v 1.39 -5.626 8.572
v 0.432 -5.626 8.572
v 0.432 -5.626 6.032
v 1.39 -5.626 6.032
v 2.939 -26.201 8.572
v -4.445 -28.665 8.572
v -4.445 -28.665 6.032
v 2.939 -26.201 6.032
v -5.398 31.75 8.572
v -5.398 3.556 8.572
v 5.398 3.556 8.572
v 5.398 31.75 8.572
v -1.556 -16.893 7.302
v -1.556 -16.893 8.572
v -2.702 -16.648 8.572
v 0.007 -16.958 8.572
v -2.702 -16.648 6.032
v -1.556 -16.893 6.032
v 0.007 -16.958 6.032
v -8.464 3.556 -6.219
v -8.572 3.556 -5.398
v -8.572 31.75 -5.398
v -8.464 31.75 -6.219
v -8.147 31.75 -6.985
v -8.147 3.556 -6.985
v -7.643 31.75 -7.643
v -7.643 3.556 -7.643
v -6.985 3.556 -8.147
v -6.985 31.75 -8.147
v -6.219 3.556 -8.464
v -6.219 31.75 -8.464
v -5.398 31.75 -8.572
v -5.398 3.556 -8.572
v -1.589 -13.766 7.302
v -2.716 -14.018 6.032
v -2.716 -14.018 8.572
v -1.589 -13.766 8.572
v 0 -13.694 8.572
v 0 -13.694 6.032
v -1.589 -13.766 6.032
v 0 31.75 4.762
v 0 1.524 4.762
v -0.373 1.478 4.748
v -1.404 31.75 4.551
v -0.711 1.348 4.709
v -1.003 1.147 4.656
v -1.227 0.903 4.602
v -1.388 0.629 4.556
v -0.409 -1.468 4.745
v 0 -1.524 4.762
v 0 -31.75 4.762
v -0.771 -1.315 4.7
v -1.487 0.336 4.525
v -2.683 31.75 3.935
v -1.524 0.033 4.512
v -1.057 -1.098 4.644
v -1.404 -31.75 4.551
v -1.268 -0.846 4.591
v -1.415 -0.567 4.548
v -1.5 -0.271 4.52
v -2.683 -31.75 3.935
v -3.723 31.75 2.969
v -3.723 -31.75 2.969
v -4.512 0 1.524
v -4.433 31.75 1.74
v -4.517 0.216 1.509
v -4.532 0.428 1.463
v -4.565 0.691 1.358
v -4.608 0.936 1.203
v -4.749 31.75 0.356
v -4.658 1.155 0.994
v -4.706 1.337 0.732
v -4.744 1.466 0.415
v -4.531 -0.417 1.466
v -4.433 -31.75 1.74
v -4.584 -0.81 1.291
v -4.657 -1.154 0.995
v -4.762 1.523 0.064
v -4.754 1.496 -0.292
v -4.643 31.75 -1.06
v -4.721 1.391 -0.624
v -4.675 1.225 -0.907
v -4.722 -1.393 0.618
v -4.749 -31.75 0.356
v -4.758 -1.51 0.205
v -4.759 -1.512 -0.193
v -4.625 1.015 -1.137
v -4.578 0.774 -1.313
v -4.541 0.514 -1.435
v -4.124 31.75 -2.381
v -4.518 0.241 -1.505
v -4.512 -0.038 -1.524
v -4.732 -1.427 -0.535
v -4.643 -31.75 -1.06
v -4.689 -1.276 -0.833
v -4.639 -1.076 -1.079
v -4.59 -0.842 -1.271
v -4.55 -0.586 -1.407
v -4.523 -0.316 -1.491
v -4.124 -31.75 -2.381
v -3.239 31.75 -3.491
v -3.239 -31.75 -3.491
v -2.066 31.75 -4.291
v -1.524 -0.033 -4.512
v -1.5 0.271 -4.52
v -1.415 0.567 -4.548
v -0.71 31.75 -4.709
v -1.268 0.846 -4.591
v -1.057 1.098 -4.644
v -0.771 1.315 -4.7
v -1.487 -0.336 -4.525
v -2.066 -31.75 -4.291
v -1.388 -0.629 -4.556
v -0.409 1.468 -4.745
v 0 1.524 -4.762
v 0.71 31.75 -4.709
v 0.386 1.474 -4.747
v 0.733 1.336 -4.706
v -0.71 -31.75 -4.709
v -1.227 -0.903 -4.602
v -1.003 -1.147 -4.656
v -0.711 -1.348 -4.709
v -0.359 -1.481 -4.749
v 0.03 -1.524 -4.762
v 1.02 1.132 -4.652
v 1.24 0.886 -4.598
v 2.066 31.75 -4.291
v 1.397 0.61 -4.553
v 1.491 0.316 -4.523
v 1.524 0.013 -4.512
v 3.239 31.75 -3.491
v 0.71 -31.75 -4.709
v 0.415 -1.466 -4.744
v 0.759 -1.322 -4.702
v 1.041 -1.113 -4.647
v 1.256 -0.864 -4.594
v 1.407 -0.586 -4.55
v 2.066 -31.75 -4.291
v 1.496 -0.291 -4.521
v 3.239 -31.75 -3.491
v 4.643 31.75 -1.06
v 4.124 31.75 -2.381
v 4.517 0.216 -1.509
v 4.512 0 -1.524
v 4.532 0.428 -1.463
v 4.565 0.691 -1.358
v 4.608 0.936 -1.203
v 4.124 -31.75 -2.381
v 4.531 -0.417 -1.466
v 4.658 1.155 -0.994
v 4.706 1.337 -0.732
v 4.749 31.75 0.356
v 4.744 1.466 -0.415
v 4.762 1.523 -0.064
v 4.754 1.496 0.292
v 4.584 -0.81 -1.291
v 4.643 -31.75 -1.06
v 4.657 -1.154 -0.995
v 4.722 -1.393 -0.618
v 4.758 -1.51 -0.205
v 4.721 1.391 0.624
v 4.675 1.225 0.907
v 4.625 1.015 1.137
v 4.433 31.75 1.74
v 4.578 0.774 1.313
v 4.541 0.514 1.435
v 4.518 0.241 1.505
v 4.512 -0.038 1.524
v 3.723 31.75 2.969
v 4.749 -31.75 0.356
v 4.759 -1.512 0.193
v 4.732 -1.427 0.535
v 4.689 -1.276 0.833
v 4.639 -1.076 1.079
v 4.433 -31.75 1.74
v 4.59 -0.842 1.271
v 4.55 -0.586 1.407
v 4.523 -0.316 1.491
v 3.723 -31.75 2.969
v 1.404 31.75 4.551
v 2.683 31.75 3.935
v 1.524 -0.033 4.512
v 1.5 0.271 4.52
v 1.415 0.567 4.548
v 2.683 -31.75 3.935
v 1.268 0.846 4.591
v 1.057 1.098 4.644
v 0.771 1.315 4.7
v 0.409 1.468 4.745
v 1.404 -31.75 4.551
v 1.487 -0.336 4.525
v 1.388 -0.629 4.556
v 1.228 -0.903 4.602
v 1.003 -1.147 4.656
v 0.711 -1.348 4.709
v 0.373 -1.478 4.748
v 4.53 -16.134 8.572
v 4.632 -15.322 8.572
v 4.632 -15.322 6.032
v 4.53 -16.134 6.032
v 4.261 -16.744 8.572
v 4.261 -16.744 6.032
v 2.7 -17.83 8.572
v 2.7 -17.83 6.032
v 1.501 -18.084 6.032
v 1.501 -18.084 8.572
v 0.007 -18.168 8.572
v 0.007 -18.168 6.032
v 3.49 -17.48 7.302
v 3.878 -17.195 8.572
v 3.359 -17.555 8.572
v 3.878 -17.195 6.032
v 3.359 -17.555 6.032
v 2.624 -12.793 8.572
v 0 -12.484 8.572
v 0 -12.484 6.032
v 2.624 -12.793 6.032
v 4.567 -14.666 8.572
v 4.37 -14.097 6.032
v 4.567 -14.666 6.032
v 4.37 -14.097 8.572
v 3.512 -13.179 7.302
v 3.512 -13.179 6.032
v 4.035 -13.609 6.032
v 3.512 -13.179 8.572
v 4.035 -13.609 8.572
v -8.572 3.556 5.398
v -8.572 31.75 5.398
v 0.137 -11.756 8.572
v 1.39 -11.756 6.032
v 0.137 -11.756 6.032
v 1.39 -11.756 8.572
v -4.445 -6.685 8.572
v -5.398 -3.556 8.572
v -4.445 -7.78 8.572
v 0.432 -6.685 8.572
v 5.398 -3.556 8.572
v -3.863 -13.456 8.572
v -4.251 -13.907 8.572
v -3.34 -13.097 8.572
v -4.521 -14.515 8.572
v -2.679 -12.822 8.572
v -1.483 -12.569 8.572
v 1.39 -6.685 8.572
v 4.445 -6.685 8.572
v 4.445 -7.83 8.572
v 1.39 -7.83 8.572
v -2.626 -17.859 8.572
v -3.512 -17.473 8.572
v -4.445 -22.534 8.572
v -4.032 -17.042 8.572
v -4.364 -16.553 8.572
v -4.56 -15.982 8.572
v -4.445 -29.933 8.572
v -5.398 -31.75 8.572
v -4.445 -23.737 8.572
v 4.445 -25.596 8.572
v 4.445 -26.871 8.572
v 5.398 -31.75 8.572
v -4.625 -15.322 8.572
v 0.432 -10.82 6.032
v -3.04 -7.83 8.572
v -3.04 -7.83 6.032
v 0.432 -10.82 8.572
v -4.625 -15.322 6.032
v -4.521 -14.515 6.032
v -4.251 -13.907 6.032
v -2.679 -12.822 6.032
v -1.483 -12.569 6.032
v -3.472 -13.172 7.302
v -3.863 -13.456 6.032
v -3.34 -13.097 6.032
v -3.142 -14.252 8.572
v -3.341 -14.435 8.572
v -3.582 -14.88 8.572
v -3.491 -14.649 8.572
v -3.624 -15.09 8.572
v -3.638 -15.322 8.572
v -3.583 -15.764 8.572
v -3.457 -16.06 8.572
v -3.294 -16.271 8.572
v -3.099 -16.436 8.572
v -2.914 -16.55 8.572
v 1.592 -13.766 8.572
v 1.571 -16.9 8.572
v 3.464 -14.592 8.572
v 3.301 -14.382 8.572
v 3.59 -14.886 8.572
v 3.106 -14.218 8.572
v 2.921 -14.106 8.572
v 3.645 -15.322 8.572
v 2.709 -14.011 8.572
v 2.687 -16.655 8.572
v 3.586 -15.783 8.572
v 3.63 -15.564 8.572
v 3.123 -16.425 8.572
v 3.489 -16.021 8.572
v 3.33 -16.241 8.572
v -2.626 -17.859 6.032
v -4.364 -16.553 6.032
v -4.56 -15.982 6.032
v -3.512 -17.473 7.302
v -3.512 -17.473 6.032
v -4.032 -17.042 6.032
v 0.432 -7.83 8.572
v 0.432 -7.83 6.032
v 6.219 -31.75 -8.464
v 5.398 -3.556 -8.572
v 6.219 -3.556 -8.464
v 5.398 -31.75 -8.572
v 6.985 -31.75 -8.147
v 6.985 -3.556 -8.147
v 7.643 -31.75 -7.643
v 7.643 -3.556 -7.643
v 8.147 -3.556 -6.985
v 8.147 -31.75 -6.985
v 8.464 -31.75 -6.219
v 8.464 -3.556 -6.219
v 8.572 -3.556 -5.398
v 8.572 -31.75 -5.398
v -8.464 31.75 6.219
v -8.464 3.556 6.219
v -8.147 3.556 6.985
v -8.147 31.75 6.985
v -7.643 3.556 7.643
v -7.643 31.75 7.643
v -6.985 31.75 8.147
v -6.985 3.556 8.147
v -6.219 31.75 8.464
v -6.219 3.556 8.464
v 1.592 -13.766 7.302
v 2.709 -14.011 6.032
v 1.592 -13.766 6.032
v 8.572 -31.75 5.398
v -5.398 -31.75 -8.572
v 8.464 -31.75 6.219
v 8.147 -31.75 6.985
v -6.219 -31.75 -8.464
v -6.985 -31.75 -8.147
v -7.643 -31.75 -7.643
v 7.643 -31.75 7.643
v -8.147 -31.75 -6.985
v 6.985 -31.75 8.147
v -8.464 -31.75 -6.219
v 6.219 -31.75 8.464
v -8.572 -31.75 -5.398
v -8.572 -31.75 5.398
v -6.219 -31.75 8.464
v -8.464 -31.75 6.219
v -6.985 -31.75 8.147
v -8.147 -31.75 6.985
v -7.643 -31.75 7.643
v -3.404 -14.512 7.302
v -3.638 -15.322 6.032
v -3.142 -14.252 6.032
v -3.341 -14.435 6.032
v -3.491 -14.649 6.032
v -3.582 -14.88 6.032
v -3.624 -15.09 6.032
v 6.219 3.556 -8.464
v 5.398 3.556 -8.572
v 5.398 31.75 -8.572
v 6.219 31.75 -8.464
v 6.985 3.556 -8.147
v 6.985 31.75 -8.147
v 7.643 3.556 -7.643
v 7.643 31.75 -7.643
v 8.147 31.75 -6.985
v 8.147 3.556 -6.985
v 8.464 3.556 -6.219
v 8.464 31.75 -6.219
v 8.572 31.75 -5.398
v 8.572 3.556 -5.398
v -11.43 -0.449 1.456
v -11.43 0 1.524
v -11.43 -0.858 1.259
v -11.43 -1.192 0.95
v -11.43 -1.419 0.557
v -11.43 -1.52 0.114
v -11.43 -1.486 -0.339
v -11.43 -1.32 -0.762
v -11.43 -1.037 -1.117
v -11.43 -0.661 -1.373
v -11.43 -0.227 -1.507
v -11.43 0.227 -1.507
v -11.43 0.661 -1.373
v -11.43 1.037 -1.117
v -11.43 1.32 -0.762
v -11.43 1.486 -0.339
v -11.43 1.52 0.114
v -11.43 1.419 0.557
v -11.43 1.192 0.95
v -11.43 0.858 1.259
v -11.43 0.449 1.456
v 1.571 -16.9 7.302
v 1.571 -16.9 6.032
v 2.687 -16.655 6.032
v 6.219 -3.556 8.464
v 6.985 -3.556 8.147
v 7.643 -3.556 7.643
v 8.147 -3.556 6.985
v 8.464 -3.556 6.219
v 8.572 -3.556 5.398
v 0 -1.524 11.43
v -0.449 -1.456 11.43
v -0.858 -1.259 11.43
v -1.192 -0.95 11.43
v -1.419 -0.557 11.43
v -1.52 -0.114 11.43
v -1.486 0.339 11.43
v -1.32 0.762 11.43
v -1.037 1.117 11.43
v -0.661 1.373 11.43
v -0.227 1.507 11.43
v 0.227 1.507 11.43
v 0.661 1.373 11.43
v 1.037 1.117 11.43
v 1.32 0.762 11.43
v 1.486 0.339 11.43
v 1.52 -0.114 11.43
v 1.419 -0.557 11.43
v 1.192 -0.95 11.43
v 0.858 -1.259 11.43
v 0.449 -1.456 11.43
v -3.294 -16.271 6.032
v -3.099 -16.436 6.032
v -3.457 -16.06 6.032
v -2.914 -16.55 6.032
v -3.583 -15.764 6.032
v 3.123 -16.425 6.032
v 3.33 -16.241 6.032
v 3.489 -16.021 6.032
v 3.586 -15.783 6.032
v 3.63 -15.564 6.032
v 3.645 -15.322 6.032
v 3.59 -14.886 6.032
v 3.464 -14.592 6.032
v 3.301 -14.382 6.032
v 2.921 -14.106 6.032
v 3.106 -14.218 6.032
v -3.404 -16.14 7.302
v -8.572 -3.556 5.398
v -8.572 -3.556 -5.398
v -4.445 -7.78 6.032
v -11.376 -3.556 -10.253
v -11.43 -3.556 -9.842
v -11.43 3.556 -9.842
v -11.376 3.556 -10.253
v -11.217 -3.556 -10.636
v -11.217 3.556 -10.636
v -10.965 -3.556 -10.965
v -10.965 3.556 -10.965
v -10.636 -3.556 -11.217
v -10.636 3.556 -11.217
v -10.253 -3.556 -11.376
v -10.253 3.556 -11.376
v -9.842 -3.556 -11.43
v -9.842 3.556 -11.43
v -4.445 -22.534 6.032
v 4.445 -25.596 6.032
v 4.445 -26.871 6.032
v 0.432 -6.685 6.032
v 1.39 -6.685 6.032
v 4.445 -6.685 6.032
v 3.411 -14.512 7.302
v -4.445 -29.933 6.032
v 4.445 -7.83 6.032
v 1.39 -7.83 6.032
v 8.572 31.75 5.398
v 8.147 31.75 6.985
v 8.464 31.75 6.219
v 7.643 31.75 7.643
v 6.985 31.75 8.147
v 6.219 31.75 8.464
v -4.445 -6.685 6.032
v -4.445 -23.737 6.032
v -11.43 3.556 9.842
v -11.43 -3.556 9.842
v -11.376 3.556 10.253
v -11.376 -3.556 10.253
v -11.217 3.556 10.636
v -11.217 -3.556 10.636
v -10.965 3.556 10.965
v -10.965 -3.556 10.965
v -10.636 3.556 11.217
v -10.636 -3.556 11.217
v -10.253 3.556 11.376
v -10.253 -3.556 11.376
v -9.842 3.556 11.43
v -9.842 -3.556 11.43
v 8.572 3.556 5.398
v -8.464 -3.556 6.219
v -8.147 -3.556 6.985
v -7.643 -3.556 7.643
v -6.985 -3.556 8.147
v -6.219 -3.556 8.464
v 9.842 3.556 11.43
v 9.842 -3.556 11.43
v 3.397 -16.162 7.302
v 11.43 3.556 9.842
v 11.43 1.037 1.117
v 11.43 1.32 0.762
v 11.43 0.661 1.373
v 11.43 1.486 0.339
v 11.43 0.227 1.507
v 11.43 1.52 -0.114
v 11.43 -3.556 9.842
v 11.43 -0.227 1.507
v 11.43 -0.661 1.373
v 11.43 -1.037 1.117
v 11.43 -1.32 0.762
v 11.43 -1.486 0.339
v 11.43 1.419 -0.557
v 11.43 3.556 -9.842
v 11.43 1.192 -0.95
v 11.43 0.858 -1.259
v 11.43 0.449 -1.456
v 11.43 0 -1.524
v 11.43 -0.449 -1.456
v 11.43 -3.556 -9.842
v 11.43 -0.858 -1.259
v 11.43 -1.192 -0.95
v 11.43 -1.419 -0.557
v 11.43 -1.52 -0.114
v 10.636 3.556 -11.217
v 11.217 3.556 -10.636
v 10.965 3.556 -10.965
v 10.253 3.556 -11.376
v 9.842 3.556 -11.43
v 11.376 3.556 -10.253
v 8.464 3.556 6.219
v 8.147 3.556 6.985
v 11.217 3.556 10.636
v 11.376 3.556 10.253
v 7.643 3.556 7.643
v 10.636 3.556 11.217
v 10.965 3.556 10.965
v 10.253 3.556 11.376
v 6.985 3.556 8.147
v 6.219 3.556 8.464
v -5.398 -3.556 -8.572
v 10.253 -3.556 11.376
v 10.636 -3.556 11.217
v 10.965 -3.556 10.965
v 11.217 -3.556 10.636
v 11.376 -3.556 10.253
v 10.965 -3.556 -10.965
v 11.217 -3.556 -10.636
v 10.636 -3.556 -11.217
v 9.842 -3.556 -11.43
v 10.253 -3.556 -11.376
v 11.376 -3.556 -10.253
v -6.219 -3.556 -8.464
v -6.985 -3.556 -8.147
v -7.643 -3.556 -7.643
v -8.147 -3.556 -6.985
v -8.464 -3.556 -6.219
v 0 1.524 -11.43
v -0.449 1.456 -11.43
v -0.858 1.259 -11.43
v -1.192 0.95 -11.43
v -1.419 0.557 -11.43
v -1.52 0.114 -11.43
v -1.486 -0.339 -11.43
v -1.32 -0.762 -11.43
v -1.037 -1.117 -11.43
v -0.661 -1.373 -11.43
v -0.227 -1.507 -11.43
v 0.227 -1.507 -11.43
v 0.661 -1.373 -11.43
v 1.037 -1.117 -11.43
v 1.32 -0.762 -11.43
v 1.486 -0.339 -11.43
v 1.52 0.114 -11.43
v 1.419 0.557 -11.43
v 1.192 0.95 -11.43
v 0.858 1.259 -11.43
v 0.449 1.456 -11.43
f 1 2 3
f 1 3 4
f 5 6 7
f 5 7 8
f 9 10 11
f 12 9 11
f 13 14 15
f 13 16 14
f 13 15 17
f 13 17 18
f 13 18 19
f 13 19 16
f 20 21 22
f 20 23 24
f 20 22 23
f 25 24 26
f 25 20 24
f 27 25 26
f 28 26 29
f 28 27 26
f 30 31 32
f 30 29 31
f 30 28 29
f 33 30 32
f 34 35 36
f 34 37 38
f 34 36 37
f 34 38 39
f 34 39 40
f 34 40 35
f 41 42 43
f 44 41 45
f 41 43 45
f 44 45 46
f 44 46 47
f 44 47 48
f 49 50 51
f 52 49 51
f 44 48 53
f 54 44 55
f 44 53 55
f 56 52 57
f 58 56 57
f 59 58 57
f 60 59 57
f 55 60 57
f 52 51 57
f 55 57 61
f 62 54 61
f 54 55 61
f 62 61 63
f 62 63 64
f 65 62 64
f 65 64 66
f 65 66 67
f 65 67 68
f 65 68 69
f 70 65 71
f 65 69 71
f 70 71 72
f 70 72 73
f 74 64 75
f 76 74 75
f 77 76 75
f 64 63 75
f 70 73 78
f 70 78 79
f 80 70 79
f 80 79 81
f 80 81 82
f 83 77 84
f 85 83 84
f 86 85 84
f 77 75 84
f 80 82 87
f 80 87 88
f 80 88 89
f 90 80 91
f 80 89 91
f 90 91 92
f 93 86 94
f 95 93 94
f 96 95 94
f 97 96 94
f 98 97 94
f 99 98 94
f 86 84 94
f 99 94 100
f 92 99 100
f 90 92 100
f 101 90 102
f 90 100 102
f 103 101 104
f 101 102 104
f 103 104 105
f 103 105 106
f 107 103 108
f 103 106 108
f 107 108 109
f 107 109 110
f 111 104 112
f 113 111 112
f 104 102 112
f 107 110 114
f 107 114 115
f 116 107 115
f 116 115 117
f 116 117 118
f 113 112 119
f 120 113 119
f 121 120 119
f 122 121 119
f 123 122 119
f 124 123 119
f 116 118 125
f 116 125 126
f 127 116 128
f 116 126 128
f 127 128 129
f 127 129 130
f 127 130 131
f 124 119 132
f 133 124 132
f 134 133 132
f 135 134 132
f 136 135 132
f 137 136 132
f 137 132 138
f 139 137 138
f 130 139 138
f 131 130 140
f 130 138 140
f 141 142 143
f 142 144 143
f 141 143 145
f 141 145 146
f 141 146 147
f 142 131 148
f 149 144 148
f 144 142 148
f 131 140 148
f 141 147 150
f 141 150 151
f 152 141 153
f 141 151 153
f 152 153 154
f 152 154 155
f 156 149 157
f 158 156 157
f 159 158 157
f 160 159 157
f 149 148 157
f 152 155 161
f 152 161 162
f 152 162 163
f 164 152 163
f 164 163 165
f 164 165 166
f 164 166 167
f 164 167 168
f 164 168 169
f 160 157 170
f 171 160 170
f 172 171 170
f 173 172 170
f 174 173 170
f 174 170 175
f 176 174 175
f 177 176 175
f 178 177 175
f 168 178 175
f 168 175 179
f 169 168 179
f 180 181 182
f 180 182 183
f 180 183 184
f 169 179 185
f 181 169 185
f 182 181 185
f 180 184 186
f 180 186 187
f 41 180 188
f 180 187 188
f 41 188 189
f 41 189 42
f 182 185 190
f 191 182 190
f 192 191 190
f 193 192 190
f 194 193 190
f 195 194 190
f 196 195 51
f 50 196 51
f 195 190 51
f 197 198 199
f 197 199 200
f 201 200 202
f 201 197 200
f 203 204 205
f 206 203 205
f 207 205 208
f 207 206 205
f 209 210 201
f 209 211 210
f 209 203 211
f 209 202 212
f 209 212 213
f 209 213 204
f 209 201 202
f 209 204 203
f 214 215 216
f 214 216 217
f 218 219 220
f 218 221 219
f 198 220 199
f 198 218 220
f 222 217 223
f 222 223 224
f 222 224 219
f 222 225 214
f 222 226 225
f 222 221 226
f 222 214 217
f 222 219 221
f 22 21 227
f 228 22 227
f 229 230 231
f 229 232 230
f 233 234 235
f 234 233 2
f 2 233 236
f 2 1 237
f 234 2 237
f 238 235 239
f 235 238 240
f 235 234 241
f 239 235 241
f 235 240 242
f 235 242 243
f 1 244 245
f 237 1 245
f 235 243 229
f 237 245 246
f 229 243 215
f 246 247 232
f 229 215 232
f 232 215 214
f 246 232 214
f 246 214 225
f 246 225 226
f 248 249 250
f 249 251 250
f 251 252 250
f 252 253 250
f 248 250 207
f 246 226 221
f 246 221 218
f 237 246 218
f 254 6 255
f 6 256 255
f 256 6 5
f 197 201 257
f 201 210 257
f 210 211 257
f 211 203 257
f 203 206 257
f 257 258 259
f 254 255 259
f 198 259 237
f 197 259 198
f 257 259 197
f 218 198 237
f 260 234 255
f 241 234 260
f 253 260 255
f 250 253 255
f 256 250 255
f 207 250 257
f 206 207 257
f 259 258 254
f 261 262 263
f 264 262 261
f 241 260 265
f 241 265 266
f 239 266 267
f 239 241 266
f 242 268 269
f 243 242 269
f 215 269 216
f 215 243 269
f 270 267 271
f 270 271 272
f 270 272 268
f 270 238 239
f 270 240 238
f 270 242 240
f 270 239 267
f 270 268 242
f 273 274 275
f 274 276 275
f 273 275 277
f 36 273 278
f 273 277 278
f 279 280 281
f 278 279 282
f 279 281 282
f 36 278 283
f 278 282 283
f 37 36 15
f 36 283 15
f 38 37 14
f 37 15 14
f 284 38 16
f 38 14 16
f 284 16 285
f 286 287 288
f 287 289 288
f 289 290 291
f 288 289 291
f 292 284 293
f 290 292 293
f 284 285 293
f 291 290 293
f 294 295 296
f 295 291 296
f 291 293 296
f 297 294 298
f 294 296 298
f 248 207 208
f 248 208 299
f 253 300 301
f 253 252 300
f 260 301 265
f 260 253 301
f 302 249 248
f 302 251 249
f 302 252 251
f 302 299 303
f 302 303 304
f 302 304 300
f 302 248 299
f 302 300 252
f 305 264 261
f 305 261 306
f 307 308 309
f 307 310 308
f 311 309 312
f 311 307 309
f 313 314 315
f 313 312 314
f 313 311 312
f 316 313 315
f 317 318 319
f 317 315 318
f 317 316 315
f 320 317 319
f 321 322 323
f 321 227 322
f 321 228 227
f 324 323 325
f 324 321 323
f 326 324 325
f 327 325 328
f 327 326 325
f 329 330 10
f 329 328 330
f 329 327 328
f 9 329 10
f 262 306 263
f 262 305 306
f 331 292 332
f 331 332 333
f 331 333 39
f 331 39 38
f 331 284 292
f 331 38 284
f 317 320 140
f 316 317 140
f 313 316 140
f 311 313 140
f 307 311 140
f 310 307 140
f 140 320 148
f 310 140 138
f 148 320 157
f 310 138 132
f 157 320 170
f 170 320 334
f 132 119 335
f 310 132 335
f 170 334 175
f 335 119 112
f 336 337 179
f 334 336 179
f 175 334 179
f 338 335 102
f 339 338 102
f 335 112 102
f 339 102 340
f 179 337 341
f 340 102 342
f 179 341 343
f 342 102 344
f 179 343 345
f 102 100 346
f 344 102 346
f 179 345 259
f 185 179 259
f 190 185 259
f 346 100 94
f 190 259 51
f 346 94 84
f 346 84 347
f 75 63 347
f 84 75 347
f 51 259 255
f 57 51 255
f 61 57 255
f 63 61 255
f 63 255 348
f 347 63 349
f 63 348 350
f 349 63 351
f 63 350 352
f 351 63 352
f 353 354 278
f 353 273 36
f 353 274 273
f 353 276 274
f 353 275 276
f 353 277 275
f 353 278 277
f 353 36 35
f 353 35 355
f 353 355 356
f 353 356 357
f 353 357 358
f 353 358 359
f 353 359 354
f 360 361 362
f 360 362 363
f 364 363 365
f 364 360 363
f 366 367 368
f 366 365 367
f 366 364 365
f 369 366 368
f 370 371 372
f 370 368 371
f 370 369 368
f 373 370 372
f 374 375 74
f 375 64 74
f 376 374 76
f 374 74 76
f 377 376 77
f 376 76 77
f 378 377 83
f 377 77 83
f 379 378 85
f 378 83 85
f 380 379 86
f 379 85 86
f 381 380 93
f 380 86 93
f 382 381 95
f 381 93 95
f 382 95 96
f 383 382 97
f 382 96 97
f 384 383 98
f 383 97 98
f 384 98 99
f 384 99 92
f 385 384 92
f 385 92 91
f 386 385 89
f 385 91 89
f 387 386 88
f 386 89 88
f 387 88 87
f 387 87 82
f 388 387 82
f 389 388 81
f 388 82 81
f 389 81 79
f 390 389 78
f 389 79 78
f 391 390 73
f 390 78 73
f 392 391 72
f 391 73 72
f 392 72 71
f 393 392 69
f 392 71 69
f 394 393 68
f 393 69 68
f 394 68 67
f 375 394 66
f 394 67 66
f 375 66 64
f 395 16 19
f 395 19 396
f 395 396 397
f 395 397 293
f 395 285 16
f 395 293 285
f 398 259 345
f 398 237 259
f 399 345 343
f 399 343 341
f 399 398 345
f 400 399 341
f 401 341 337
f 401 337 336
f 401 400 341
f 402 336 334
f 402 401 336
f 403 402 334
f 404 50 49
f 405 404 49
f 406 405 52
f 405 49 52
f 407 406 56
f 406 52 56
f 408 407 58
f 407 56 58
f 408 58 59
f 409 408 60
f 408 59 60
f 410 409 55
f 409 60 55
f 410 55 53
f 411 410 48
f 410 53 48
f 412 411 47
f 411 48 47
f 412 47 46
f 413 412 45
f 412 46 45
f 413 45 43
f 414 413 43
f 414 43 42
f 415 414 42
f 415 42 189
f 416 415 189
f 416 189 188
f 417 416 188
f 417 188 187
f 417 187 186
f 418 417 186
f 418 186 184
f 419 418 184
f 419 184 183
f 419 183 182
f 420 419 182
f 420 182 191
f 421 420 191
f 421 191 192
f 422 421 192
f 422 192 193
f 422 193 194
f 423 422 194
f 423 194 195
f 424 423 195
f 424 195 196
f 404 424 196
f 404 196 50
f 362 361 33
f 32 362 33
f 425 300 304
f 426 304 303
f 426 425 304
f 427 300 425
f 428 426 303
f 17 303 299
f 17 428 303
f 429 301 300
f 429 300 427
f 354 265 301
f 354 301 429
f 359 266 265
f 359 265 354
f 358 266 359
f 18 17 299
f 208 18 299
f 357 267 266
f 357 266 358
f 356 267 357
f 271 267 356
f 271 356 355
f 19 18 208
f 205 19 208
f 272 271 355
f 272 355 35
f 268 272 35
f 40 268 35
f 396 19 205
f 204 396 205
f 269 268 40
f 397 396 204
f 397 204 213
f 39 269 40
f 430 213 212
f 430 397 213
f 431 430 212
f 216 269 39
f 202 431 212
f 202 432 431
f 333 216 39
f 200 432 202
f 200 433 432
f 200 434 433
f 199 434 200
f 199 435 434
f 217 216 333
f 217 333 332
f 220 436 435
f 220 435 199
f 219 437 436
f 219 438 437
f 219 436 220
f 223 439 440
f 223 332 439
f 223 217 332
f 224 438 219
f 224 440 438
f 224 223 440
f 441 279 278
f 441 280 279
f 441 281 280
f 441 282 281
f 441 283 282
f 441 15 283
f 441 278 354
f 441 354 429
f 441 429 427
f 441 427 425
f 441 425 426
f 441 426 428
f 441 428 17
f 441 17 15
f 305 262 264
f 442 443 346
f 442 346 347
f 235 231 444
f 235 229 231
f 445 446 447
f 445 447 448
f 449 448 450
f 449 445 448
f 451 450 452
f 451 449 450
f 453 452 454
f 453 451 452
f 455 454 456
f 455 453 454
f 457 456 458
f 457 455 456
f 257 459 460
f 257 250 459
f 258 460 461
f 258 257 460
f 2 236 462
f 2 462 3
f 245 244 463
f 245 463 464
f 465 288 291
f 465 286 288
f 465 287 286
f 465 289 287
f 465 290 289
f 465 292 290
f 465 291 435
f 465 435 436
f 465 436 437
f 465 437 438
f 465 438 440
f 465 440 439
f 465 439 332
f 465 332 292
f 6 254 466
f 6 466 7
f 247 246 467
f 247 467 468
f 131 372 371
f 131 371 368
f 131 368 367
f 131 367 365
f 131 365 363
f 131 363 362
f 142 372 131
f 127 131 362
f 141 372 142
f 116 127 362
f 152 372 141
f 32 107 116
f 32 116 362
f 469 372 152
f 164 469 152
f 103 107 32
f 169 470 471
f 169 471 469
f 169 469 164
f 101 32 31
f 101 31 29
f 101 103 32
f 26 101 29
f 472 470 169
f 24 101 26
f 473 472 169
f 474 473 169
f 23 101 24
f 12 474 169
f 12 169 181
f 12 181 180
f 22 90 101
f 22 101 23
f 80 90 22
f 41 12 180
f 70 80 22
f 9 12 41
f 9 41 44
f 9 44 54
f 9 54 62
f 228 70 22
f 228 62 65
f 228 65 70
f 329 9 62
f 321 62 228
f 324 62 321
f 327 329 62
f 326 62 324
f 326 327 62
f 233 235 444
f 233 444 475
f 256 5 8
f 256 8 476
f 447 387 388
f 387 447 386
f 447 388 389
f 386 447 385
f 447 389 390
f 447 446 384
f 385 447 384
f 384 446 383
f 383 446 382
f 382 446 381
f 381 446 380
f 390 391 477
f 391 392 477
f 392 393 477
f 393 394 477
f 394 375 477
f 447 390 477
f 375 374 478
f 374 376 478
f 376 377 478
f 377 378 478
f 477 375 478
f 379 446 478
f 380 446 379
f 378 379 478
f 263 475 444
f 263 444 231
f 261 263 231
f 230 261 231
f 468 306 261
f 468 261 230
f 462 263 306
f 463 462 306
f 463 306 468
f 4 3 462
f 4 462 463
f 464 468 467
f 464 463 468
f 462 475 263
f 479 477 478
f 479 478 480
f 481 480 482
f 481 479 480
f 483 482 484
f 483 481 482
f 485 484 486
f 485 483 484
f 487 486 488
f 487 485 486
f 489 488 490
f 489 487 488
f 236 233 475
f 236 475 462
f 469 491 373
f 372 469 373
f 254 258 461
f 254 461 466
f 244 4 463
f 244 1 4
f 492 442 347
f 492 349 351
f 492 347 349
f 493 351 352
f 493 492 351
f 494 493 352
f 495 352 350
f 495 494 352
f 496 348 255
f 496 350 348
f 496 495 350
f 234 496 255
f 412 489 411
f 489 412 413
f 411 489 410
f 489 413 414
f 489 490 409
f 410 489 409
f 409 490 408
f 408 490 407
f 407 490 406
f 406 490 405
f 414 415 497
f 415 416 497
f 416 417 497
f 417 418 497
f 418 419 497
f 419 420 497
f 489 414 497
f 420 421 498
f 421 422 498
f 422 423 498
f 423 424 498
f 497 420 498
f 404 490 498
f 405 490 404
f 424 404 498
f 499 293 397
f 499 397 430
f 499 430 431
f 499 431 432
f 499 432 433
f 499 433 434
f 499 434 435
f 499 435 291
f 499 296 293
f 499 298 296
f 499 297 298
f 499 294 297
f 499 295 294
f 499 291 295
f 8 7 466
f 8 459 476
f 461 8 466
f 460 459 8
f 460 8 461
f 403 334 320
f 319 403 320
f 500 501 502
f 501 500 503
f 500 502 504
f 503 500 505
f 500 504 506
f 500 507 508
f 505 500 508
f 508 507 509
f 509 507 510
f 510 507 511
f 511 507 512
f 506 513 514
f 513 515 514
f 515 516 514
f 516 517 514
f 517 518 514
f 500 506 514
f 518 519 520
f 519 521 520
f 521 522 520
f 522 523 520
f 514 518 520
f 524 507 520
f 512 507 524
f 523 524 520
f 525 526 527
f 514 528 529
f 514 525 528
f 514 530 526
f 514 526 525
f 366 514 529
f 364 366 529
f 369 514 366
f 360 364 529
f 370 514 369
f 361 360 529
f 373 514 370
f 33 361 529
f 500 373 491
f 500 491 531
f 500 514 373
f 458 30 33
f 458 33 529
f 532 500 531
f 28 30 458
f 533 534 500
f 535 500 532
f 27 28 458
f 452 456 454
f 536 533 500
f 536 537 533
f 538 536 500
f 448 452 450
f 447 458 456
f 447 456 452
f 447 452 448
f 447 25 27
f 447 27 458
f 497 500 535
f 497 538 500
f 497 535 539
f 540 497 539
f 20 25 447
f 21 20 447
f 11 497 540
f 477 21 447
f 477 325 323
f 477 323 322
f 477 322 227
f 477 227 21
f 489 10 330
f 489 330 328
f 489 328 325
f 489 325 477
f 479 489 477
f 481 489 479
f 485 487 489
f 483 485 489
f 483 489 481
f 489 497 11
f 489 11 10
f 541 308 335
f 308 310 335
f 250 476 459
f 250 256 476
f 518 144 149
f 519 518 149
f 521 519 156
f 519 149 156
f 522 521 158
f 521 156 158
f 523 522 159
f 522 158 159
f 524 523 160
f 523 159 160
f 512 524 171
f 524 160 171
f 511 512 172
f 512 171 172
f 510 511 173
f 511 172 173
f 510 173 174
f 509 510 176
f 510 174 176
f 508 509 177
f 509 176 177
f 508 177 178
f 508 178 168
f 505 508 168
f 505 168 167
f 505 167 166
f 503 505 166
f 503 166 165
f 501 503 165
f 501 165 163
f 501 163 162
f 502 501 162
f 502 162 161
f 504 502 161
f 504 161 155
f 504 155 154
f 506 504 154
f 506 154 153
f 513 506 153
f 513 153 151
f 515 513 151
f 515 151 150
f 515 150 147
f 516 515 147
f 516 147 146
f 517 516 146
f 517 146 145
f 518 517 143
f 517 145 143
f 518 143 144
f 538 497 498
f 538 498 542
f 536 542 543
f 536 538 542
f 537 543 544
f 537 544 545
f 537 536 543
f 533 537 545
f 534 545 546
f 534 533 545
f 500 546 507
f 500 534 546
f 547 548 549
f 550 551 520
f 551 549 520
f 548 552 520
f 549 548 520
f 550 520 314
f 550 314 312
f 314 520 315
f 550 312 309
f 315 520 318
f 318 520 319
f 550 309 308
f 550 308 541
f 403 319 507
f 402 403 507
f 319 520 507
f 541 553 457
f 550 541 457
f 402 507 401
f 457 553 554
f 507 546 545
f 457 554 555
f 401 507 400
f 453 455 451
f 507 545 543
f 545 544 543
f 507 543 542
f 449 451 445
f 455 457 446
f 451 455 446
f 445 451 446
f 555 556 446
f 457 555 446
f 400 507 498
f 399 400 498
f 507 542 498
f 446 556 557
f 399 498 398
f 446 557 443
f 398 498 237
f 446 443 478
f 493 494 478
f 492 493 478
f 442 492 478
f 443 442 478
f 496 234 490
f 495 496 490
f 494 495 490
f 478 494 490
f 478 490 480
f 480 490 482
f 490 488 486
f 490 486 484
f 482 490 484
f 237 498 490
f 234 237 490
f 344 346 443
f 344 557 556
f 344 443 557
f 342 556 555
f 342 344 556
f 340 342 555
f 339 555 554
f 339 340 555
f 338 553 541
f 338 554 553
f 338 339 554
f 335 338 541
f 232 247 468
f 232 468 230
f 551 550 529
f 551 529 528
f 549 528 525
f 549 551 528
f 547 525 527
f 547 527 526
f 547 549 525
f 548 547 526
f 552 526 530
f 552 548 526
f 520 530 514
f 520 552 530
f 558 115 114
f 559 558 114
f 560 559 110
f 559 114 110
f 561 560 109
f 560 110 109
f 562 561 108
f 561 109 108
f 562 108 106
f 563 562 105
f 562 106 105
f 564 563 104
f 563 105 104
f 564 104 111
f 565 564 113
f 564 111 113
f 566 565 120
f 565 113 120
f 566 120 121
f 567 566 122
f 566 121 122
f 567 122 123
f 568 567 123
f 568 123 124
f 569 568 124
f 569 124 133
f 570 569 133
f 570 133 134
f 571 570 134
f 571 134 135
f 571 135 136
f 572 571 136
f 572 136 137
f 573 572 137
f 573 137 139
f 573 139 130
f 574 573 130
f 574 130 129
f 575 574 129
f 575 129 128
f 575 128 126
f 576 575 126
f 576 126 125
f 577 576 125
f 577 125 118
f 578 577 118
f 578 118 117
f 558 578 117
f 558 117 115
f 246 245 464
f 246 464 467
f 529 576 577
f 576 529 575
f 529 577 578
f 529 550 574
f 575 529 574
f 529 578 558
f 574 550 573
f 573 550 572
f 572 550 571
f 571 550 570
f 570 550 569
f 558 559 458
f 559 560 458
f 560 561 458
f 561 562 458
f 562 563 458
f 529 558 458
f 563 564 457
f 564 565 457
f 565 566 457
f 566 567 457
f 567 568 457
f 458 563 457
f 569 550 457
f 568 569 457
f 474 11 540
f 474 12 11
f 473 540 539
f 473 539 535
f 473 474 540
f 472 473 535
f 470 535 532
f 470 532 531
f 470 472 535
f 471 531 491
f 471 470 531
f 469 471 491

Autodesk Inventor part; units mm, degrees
ref_plane "YZ Plane" through (0, 0, 0) normal (1, 0, 0) x (0, 1, 0)
ref_plane "XZ Plane" through (0, 0, 0) normal (0, 1, 0) x (-1, 0, 0)
ref_plane "XY Plane" through (0, 0, 0) normal (0, 0, 1) x (1, 0, 0)
sketch "Sketch1" plane through (0, 0, 0) normal (0, 1, 0) x (-1, 0, 0)
  line L0 (11.43, 11.43) -> (-11.43, 11.43)
  line L1 (-11.43, 11.43) -> (-11.43, -11.43)
  line L2 (-11.43, -11.43) -> (11.43, -11.43)
  line L3 (11.43, -11.43) -> (11.43, 11.43)
  line L4 (11.43, 11.43) -> (-11.43, -11.43) construction
  line L5 (-11.43, 11.43) -> (11.43, -11.43) construction
  point P0 (0, 0)
  dimension "outerWidth" = 22.86
  dimension "outerLength" = 22.86
extrude "Extrusion1" add sketch "Sketch1" along normal mid plane 7.112
sketch "Sketch2" plane through (0, 0, 0) normal (0, 1, 0) x (-1, 0, 0)
  line L0 (8.5725, 8.5725) -> (-8.5725, 8.5725)
  line L1 (-8.5725, 8.5725) -> (-8.5725, -8.5725)
  line L2 (-8.5725, -8.5725) -> (8.5725, -8.5725)
  line L3 (8.5725, -8.5725) -> (8.5725, 8.5725)
  line L4 (8.5725, 8.5725) -> (-8.5725, -8.5725) construction
  line L5 (-8.5725, 8.5725) -> (8.5725, -8.5725) construction
  point P0 (0, 0)
  dimension "innerWidth" = 17.145
  dimension "innerLength" = 17.145
extrude "Extrusion2" add sketch "Sketch2" along normal mid plane 63.5
sketch "Sketch3" plane through (-8.5725, -3.556, 8.5725) normal (0, 0, 1) x (1, 0, 0)
  line L0 (0, -28.194) -> (17.145, -28.194) construction
  line L1 (13.0175, -28.194) -> (13.0175, 0) construction
  line L2 (20.0025, 0) -> (-2.8575, 0) construction
  line L3 (17.145, 0) -> (17.145, -28.194) projected
  line L4 (4.1275, -18.9779) -> (13.0175, -22.0396)
  line L5 (13.0175, -22.0396) -> (13.0175, -23.3148)
  line L6 (13.0175, -23.3148) -> (4.1275, -26.3766)
  line L7 (4.1275, -26.3766) -> (4.1275, -25.1086)
  line L8 (4.1275, -25.1086) -> (11.5118, -22.6448)
  line L9 (11.5118, -22.6448) -> (4.1275, -20.181)
  line L10 (4.1275, -20.181) -> (4.1275, -18.9779)
  spline S0 degree 2 poles (8.5725, -8.928) (10.9643, -8.928) (13.2048, -10.3184) (13.2048, -11.7664) knots 0 0 0 1 2 2 2
  spline S1 degree 2 poles (13.2048, -11.7664) (13.2048, -13.2361) (10.9211, -14.6121) (8.5797, -14.6121) knots 0 0 0 1 2 2 2
  spline S2 degree 2 poles (8.5797, -14.6121) (6.1735, -14.6121) (3.9474, -13.2217) (3.9474, -11.7664) knots 0 0 0 1 2 2 2
  spline S3 degree 2 poles (3.9474, -11.7664) (3.9474, -10.304) (6.2527, -8.928) (8.5725, -8.928) knots 0 0 0 1 2 2 2
  spline S4 degree 2 poles (11.2813, -10.4553) (10.8418, -10.2824) (9.4874, -10.1383) (8.5725, -10.1383) knots 0 0 0 1 2 2 2
  spline S5 degree 2 poles (8.5725, -10.1383) (7.6576, -10.1383) (6.3104, -10.2824) (5.8565, -10.4625) knots 0 0 0 1 2 2 2
  spline S6 degree 2 poles (5.8565, -10.4625) (5.4026, -10.6426) (4.9344, -11.2693) (4.9344, -11.7664) knots 0 0 0 1 2 2 2
  spline S7 degree 2 poles (4.9344, -11.7664) (4.9344, -12.2635) (5.4026, -12.9047) (5.8709, -13.092) knots 0 0 0 1 2 2 2
  spline S8 degree 2 poles (5.8709, -13.092) (6.3248, -13.2721) (7.708, -13.4018) (8.5797, -13.4018) knots 0 0 0 1 2 2 2
  spline S9 degree 2 poles (8.5797, -13.4018) (9.5163, -13.4018) (10.7698, -13.2865) (11.2597, -13.0992) knots 0 0 0 1 2 2 2
  spline S10 degree 2 poles (11.2597, -13.0992) (11.7207, -12.9263) (12.2178, -12.2851) (12.2178, -11.7664) knots 0 0 0 1 2 2 2
  spline S11 degree 2 poles (12.2178, -11.7664) (12.2178, -11.2766) (11.7496, -10.6354) (11.2813, -10.4553) knots 0 0 0 1 2 2 2
  line L11 (9.9629, -2.0696) -> (9.9629, -3.1286)
  line L12 (9.9629, -3.1286) -> (13.0175, -3.1286)
  line L13 (13.0175, -3.1286) -> (13.0175, -4.2741)
  line L14 (13.0175, -4.2741) -> (9.9629, -4.2741)
  line L15 (9.9629, -4.2741) -> (9.9629, -8.2004)
  line L16 (9.9629, -8.2004) -> (8.7094, -8.2004)
  line L17 (8.7094, -8.2004) -> (4.1275, -4.2236)
  line L18 (4.1275, -4.2236) -> (4.1275, -3.1286)
  line L19 (4.1275, -3.1286) -> (9.0048, -3.1286)
  line L20 (9.0048, -3.1286) -> (9.0048, -2.0696)
  line L21 (9.0048, -2.0696) -> (9.9629, -2.0696)
  line L22 (9.0048, -4.2741) -> (5.5323, -4.2741)
  line L23 (5.5323, -4.2741) -> (9.0048, -7.2638)
  line L24 (9.0048, -7.2638) -> (9.0048, -4.2741)
  point P0 (8.5725, 3.556)
  dimension "textCenterLine" = 4.1275
extrude "Extrusion4" cut sketch "Sketch3" against normal blind 2.54
sketch "Sketch4" plane through (0, 31.75, 0) normal (0, 1, 0) x (1, 0, 0)
  point P0 (0, 0)
  point P1 (0, 0)
hole "Hole1" at (0, 31.75, 0) direction (0, -1, 0) diameter 9.525 end through all
fillet "Fillet1" radius 1.5875 4 edges at (-11.43, 0, 11.43) (11.43, 0, 11.43) (11.43, 0, -11.43) (-11.43, 0, -11.43)
fillet "Fillet2" radius 3.175 8 edges at (8.5725, 17.653, -8.5725) (8.5725, 17.653, 8.5725) (-8.5725, 17.653, -8.5725) (-8.5725, 17.653, 8.5725) (8.5725, -17.653, -8.5725) (8.5725, -17.653, 8.5725) (-8.5725, -17.653, -8.5725) (-8.5725, -17.653, 8.5725)
sketch "Sketch5" plane through (-9.8425, 3.556, 11.43) normal (0, 0, 1) x (1, 0, 0)
  point P0 (9.8425, -3.556)
  point P1 (9.8425, -3.556)
sketch "Sketch6" plane through (11.43, -3.556, -9.8425) normal (1, 0, 0) x (0, 0, -1)
  point P0 (-9.8425, 3.556)
  point P1 (-9.8425, 3.556)
sketch "Sketch7" plane through (9.8425, 3.556, -11.43) normal (0, 0, -1) x (-1, 0, 0)
  point P0 (9.8425, -3.556)
  point P1 (9.8425, -3.556)
sketch "Sketch8" plane through (-11.43, -3.556, -9.8425) normal (-1, 0, 0) x (0, 0, 1)
  point P0 (9.8425, 3.556)
  point P1 (9.8425, 3.556)
hole "Hole2" at (0, 0, 11.43) direction (0, 0, -1) diameter 3.048 depth 12.7 tip angle 118
hole "Hole3" at (11.43, 0, 0) direction (-1, 0, 0) diameter 3.048 depth 12.7 tip angle 118
hole "Hole4" at (0, 0, -11.43) direction (0, 0, 1) diameter 3.048 depth 12.7 tip angle 118
hole "Hole5" at (-11.43, 0, 0) direction (1, 0, 0) diameter 3.048 depth 12.7 tip angle 118
equation "\"textCenterLine\" = 0.5 * innerWidth - 0.5 * textHeight"
equation "\"textHeight\" = 8.89"
properties part number "Supports"
